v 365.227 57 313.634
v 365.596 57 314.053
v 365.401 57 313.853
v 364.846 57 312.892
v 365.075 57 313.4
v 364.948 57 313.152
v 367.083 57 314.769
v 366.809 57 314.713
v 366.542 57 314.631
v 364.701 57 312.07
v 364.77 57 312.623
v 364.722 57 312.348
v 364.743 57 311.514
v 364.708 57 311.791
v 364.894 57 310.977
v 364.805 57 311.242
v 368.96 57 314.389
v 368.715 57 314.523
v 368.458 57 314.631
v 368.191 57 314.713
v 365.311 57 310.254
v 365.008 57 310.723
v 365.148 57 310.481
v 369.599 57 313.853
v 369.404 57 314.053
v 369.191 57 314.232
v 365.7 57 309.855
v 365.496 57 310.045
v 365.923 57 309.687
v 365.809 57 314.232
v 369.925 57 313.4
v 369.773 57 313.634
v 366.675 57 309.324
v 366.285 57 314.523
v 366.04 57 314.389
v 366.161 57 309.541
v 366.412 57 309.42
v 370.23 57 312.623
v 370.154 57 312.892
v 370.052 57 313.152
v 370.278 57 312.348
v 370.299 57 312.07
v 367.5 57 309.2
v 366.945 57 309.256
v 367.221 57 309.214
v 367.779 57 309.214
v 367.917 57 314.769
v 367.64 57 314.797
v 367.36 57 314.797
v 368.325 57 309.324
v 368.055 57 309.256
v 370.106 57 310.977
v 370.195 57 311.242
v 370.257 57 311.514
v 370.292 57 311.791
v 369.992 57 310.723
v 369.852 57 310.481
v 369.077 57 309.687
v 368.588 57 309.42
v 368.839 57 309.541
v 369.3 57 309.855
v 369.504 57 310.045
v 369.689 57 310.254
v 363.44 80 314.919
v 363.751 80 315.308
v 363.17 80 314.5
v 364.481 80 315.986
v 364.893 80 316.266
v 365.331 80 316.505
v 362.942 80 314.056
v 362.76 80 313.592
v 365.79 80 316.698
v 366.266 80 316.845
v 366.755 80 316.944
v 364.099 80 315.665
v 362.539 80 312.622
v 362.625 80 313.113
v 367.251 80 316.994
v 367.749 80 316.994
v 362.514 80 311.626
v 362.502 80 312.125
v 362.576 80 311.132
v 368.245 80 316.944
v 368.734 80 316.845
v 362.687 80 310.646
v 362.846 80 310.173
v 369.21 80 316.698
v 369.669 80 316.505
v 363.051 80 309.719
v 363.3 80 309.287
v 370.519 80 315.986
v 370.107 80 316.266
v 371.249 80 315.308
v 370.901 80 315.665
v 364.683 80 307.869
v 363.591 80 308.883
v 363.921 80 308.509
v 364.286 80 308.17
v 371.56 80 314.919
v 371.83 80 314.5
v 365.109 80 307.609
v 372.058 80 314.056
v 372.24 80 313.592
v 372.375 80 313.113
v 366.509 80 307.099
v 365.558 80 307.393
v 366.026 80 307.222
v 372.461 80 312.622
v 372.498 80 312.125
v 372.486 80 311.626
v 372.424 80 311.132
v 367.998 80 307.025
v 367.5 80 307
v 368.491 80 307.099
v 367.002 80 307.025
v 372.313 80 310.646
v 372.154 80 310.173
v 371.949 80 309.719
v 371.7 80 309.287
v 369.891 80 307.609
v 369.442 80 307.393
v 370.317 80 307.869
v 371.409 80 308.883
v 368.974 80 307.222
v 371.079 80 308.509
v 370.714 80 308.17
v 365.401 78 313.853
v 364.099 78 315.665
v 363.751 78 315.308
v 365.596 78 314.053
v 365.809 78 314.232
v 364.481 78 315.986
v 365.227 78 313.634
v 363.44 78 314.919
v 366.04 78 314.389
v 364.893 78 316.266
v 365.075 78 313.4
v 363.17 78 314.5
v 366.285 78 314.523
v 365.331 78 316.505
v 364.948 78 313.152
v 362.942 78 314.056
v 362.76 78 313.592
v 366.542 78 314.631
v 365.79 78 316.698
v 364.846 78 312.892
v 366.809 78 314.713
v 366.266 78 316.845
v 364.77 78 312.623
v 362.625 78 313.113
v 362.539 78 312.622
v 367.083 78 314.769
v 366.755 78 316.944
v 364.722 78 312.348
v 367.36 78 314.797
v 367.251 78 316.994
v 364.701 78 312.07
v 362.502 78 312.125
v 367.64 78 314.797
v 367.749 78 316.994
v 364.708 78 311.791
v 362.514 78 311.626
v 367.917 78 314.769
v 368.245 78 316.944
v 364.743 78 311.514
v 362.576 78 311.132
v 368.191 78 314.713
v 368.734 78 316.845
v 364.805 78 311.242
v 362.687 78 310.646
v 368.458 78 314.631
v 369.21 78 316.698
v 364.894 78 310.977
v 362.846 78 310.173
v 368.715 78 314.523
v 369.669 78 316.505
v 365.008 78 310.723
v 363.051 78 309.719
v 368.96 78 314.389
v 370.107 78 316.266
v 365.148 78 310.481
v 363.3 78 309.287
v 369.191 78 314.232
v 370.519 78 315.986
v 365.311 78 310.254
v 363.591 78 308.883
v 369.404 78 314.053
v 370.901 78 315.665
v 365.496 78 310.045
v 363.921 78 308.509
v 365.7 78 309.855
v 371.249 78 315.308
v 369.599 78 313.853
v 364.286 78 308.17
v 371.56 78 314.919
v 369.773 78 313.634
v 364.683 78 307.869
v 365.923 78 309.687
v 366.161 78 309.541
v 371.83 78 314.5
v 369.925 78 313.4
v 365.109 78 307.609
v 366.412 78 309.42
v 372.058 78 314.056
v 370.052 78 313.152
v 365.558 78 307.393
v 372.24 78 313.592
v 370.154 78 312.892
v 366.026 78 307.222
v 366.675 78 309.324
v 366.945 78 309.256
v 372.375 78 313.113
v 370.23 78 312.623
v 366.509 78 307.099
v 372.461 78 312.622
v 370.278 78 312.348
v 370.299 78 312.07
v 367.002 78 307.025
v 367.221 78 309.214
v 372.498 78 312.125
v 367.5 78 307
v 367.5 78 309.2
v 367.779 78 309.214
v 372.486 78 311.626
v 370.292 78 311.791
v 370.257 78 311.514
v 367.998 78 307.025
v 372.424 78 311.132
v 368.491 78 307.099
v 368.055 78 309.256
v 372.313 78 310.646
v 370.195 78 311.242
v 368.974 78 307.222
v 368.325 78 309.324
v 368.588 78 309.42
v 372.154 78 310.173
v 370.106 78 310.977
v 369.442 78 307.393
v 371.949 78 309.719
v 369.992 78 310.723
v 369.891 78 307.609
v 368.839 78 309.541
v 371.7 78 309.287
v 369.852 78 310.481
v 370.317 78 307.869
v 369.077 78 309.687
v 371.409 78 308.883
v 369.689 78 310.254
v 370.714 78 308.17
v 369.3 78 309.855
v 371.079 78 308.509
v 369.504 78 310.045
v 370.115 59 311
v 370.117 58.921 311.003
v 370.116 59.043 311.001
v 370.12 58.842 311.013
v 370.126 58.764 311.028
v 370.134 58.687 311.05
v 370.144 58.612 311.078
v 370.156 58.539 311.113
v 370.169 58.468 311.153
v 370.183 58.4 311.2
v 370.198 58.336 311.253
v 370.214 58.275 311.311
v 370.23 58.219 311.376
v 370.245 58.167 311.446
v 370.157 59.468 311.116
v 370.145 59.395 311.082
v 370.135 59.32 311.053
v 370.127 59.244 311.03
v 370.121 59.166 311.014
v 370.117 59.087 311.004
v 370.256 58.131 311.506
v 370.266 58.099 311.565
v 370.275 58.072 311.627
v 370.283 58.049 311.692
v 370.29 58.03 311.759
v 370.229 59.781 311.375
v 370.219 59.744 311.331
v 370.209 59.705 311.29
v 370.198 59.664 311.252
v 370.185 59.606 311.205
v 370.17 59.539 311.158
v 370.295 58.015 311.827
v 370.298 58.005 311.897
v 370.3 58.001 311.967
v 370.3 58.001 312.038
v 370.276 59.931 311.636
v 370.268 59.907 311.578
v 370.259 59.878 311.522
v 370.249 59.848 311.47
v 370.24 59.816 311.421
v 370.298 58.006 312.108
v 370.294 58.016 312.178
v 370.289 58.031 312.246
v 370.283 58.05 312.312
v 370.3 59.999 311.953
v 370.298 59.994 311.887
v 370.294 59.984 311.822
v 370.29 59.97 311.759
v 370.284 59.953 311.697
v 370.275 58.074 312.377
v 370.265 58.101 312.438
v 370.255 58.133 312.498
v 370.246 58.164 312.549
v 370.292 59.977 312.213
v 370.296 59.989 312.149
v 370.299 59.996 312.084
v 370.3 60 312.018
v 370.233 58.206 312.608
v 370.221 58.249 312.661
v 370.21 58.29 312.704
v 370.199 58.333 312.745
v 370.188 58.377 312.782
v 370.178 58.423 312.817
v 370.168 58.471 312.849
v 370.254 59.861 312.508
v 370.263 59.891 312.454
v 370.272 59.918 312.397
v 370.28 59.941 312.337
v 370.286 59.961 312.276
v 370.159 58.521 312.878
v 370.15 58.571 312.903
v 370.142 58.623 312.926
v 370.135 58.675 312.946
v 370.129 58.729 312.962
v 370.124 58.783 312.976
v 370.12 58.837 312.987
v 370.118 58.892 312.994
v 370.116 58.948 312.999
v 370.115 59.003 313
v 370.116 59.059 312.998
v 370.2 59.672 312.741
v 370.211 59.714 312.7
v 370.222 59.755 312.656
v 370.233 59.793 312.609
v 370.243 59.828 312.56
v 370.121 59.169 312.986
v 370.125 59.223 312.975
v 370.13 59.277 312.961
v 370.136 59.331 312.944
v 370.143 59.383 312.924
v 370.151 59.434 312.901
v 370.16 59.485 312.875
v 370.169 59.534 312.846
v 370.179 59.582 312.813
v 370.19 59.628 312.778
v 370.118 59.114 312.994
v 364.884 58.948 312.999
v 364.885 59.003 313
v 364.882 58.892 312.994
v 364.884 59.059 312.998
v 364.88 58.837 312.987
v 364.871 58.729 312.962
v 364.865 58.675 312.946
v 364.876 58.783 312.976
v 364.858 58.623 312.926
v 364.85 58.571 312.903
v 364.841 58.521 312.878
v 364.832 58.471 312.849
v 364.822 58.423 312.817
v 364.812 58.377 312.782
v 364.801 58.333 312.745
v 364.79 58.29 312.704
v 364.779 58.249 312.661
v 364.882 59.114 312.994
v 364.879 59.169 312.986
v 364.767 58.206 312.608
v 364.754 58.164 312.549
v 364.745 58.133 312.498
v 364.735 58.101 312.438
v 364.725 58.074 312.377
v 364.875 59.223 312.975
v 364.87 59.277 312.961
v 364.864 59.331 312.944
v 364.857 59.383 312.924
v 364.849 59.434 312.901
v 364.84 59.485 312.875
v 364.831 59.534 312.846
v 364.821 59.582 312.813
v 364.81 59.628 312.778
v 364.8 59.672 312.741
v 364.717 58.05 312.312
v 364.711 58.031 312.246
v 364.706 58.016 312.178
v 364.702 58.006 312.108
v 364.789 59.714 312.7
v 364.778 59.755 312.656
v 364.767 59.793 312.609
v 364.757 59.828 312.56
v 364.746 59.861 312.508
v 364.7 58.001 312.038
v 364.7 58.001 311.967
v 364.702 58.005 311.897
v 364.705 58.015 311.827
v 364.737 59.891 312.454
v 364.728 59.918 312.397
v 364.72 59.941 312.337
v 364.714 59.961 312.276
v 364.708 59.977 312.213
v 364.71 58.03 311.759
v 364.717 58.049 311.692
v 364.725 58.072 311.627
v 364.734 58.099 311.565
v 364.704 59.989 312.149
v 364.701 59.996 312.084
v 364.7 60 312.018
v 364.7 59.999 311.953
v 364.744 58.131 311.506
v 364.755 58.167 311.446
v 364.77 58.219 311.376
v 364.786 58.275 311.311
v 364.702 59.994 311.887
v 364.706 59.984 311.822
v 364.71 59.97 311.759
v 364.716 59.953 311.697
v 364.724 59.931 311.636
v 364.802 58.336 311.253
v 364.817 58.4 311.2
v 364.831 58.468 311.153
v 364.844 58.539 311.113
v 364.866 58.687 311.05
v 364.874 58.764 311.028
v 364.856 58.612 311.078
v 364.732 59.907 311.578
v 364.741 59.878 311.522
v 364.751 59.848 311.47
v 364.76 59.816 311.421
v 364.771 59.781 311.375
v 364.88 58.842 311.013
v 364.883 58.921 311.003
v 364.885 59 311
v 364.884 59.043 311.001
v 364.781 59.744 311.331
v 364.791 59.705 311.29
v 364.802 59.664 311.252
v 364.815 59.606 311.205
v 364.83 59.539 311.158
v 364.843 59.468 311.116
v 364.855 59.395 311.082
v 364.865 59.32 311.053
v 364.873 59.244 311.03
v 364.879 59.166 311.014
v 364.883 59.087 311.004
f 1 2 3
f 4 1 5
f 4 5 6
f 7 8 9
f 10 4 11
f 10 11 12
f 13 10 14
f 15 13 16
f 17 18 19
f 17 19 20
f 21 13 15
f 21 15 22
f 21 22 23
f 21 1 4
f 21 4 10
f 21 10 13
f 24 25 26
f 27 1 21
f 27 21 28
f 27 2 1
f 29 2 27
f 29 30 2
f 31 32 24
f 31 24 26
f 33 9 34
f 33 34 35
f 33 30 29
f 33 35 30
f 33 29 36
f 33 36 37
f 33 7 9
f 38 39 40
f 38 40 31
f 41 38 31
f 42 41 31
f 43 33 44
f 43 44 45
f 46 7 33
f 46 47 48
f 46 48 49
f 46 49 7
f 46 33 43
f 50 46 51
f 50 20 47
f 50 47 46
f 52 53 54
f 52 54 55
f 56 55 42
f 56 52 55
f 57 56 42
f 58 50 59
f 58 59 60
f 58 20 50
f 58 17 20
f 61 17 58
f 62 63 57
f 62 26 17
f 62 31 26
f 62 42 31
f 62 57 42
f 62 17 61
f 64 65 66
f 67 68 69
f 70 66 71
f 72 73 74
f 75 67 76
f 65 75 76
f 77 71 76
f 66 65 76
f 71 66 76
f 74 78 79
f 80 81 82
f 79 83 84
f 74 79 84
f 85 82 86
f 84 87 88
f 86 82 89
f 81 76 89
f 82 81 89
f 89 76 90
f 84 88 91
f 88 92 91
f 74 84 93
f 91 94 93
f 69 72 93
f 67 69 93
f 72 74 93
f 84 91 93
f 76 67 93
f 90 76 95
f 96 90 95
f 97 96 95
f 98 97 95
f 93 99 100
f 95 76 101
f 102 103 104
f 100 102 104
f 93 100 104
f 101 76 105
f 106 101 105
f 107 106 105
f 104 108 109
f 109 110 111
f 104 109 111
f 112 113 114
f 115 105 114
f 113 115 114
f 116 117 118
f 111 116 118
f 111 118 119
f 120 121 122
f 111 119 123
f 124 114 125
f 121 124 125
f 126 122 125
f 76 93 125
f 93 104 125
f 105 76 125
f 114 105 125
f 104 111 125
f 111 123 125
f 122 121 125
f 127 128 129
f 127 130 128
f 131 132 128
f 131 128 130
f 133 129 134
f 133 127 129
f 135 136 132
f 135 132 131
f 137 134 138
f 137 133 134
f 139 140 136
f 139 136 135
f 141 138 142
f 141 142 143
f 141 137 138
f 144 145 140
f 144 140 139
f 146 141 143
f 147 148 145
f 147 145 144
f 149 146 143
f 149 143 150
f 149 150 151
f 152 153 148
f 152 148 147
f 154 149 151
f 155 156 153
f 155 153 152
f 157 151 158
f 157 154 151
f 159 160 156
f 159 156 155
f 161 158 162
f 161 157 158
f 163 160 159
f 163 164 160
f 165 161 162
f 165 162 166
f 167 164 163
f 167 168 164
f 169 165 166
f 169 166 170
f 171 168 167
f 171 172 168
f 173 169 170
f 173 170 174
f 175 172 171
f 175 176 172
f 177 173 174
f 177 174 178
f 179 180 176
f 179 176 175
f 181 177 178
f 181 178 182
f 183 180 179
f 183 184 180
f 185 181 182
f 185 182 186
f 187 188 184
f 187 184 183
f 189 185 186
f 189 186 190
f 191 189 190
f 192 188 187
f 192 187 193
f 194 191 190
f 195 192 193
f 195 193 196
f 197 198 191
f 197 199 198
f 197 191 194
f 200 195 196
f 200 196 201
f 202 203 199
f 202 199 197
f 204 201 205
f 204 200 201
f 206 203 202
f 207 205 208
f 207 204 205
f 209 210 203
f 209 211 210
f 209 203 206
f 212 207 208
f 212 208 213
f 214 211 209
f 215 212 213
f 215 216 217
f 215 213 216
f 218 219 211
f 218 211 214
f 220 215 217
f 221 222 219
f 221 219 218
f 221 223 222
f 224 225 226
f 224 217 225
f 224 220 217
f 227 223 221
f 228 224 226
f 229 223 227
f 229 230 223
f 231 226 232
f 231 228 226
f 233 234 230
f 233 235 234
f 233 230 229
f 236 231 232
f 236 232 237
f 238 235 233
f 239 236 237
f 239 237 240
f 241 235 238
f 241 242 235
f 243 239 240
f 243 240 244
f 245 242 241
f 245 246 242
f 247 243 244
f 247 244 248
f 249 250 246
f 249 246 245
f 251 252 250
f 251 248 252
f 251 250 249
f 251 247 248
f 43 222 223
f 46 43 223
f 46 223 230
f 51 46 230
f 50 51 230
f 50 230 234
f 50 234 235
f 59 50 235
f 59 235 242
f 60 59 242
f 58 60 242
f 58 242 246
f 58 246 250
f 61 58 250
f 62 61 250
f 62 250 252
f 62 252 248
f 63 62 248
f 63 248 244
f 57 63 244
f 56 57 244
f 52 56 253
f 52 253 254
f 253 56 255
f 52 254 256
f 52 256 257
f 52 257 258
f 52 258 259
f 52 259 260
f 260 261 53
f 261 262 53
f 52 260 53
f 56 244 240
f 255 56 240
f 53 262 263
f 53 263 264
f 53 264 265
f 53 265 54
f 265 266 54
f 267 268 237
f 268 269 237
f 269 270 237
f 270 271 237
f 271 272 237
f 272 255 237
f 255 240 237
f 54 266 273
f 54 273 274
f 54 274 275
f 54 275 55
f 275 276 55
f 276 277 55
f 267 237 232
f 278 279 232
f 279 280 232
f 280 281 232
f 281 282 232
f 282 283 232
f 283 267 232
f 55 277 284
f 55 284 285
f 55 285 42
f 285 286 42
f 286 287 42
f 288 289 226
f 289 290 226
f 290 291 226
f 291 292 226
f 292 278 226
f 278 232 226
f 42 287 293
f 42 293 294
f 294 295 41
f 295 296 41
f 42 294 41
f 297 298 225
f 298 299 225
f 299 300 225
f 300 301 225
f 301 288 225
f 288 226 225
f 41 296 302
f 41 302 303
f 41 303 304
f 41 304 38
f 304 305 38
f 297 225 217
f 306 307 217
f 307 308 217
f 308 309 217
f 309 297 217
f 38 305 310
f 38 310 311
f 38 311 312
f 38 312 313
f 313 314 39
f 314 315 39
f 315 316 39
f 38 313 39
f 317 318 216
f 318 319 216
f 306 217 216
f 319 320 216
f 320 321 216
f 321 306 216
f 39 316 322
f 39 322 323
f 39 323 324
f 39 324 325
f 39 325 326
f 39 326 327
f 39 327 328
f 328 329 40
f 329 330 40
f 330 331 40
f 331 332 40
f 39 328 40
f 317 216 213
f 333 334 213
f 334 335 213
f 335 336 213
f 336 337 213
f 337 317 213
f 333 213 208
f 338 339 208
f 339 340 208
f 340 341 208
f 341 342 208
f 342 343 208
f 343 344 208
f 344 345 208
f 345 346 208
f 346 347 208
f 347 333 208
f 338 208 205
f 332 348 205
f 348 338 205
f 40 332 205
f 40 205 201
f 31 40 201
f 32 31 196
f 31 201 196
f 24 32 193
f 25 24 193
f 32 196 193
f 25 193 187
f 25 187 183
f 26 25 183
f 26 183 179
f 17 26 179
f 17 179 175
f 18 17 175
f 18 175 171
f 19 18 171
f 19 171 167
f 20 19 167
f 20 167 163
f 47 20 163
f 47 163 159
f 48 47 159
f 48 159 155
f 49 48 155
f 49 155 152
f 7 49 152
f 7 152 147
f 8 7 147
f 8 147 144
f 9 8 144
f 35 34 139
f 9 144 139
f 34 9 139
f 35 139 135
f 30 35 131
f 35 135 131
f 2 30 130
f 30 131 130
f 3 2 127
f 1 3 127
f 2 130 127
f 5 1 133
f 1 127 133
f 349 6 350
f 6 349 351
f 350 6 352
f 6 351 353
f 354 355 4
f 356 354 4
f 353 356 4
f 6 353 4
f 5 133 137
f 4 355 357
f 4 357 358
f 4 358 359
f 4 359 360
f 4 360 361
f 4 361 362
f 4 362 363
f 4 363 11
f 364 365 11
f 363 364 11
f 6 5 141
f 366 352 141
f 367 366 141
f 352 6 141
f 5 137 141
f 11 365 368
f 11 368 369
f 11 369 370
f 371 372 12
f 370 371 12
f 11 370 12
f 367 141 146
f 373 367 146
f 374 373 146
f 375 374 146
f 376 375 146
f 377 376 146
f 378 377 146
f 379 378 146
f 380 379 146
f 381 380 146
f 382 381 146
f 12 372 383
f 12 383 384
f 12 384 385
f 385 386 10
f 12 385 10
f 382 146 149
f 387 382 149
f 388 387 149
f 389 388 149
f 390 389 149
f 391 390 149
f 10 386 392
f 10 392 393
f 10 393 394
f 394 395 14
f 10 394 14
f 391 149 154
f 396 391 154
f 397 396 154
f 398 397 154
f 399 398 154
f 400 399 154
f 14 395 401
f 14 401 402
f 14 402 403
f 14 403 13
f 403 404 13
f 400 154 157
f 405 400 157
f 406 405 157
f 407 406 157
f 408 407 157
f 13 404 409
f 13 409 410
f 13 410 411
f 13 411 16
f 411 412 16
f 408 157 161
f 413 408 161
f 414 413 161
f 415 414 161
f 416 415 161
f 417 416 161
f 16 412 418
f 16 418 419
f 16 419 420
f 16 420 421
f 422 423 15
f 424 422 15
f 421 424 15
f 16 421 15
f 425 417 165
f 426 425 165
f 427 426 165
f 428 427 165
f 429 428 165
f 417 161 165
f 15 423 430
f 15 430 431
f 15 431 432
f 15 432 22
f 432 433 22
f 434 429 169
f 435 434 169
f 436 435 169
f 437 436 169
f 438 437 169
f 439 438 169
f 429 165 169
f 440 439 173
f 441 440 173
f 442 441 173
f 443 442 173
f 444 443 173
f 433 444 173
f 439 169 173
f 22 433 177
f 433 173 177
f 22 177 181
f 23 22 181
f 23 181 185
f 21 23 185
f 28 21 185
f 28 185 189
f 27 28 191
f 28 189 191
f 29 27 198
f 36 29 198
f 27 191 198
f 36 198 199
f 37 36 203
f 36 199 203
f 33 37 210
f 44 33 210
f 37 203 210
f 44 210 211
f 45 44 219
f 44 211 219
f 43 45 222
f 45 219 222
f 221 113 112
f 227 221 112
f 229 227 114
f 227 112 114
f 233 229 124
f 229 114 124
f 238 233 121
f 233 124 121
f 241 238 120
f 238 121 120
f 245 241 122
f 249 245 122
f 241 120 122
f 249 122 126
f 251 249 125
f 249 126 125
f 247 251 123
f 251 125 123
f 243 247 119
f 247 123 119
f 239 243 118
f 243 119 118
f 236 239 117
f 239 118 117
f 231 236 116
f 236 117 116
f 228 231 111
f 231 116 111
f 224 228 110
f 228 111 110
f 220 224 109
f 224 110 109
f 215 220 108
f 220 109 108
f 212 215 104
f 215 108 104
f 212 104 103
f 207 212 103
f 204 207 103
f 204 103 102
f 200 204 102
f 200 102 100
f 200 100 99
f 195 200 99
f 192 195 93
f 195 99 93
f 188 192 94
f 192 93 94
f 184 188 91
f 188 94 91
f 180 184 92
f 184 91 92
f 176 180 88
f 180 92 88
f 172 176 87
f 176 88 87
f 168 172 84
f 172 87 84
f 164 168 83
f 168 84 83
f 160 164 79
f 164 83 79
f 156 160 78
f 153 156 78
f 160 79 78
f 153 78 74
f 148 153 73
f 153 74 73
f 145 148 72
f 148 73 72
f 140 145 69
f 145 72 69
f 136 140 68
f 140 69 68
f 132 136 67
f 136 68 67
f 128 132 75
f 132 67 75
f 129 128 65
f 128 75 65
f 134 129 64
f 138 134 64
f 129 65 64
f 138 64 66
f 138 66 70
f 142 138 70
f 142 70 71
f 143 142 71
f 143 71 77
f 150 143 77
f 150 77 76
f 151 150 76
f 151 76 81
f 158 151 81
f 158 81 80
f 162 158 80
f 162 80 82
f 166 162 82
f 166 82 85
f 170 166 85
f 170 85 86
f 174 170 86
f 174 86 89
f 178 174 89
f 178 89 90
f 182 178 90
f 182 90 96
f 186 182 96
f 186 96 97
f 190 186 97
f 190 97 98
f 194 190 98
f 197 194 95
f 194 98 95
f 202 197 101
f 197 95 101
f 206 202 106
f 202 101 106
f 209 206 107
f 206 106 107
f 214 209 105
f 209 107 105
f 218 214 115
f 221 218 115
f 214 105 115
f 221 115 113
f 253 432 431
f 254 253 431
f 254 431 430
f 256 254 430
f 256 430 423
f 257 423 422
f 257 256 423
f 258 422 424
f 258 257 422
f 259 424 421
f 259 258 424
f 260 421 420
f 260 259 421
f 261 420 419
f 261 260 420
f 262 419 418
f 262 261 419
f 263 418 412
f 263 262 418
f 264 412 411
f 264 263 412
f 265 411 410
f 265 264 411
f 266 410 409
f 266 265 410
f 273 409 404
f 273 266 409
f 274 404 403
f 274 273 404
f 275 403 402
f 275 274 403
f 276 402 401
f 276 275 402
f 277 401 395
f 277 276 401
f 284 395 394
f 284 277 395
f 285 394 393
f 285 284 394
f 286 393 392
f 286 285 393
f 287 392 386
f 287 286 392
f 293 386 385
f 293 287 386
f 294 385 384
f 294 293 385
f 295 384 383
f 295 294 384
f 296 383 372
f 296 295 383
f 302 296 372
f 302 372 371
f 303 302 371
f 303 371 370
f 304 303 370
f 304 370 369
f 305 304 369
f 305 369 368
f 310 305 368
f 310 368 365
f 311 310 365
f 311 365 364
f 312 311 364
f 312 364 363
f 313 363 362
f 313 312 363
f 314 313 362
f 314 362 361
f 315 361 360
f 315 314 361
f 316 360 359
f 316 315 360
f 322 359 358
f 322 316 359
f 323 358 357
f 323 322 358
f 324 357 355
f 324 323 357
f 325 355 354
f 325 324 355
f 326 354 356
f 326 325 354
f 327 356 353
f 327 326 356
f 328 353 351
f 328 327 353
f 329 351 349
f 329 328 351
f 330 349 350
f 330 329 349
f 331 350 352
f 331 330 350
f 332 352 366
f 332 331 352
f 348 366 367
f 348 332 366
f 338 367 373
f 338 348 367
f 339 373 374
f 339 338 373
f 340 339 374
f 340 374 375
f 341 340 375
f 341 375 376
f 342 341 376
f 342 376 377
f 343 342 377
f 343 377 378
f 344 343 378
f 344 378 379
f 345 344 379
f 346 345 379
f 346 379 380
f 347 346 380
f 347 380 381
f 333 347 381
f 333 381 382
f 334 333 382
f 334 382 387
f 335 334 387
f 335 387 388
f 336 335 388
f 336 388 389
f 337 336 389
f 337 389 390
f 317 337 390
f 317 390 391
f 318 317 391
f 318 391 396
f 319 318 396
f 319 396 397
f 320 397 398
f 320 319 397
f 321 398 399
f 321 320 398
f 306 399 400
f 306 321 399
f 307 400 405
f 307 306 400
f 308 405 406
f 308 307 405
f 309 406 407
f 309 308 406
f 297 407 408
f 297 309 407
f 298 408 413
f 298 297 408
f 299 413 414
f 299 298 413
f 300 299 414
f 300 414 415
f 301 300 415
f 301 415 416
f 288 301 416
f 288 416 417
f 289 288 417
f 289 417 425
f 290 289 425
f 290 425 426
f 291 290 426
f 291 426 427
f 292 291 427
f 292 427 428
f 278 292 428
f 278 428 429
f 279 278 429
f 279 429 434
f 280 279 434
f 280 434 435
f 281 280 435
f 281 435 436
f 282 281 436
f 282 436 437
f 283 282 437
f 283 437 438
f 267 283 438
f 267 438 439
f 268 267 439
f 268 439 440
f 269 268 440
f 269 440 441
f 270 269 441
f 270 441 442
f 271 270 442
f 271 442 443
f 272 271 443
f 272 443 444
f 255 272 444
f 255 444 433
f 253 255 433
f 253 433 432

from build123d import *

# Parameters (mm, degrees)
SKETCH017_R            = 1
PAD017_DEPTH           = 10
CYLINDER032_R          = 2.8
CYLINDER032_DEPTH      = 21
CYLINDER033_R          = 5
CYLINDER033_DEPTH      = 2
CUT015_PITCH_ANGLE     = 90
CUT015_PLACEMENT_ANGLE = -90


with BuildPart() as pad017:
    # Sketch017 → Pad017 (new body)
    with BuildSketch(Plane(origin=(0, 4.2, 21), x_dir=(1, 0, 0), z_dir=(0, -1, 0))):
        Circle(SKETCH017_R)
    extrude(amount=PAD017_DEPTH)


with BuildPart() as eje001:
    # Cylinder032 → Cylinder032 (new body)
    with BuildSketch(Plane.XY.offset(2)):
        Circle(CYLINDER032_R)
    extrude(amount=CYLINDER032_DEPTH)


with BuildPart() as eje_full1:
    # Cylinder033 → Cylinder033 (new body)
    with BuildSketch(Plane.XY):
        Circle(CYLINDER033_R)
    extrude(amount=CYLINDER033_DEPTH)

    # Fusion009003019: union Eje001
    add(eje001.part)

    # Cut015: cut Pad017
    add(pad017.part, mode=Mode.SUBTRACT)


with BuildPart() as eje_full1_1:
    # Cut015 pitch: moved
    add(eje_full1.part.rotate(Axis((0, 0, 0), (0, 1, 0)), CUT015_PITCH_ANGLE))


with BuildPart() as eje_full1_2:
    # Cut015 placement: moved
    add(eje_full1_1.part.moved(Location((367.5, 80, 312))).rotate(Axis((367.5, 80, 312), (0, 0, 1)), CUT015_PLACEMENT_ANGLE))


solid = eje_full1_2.part
